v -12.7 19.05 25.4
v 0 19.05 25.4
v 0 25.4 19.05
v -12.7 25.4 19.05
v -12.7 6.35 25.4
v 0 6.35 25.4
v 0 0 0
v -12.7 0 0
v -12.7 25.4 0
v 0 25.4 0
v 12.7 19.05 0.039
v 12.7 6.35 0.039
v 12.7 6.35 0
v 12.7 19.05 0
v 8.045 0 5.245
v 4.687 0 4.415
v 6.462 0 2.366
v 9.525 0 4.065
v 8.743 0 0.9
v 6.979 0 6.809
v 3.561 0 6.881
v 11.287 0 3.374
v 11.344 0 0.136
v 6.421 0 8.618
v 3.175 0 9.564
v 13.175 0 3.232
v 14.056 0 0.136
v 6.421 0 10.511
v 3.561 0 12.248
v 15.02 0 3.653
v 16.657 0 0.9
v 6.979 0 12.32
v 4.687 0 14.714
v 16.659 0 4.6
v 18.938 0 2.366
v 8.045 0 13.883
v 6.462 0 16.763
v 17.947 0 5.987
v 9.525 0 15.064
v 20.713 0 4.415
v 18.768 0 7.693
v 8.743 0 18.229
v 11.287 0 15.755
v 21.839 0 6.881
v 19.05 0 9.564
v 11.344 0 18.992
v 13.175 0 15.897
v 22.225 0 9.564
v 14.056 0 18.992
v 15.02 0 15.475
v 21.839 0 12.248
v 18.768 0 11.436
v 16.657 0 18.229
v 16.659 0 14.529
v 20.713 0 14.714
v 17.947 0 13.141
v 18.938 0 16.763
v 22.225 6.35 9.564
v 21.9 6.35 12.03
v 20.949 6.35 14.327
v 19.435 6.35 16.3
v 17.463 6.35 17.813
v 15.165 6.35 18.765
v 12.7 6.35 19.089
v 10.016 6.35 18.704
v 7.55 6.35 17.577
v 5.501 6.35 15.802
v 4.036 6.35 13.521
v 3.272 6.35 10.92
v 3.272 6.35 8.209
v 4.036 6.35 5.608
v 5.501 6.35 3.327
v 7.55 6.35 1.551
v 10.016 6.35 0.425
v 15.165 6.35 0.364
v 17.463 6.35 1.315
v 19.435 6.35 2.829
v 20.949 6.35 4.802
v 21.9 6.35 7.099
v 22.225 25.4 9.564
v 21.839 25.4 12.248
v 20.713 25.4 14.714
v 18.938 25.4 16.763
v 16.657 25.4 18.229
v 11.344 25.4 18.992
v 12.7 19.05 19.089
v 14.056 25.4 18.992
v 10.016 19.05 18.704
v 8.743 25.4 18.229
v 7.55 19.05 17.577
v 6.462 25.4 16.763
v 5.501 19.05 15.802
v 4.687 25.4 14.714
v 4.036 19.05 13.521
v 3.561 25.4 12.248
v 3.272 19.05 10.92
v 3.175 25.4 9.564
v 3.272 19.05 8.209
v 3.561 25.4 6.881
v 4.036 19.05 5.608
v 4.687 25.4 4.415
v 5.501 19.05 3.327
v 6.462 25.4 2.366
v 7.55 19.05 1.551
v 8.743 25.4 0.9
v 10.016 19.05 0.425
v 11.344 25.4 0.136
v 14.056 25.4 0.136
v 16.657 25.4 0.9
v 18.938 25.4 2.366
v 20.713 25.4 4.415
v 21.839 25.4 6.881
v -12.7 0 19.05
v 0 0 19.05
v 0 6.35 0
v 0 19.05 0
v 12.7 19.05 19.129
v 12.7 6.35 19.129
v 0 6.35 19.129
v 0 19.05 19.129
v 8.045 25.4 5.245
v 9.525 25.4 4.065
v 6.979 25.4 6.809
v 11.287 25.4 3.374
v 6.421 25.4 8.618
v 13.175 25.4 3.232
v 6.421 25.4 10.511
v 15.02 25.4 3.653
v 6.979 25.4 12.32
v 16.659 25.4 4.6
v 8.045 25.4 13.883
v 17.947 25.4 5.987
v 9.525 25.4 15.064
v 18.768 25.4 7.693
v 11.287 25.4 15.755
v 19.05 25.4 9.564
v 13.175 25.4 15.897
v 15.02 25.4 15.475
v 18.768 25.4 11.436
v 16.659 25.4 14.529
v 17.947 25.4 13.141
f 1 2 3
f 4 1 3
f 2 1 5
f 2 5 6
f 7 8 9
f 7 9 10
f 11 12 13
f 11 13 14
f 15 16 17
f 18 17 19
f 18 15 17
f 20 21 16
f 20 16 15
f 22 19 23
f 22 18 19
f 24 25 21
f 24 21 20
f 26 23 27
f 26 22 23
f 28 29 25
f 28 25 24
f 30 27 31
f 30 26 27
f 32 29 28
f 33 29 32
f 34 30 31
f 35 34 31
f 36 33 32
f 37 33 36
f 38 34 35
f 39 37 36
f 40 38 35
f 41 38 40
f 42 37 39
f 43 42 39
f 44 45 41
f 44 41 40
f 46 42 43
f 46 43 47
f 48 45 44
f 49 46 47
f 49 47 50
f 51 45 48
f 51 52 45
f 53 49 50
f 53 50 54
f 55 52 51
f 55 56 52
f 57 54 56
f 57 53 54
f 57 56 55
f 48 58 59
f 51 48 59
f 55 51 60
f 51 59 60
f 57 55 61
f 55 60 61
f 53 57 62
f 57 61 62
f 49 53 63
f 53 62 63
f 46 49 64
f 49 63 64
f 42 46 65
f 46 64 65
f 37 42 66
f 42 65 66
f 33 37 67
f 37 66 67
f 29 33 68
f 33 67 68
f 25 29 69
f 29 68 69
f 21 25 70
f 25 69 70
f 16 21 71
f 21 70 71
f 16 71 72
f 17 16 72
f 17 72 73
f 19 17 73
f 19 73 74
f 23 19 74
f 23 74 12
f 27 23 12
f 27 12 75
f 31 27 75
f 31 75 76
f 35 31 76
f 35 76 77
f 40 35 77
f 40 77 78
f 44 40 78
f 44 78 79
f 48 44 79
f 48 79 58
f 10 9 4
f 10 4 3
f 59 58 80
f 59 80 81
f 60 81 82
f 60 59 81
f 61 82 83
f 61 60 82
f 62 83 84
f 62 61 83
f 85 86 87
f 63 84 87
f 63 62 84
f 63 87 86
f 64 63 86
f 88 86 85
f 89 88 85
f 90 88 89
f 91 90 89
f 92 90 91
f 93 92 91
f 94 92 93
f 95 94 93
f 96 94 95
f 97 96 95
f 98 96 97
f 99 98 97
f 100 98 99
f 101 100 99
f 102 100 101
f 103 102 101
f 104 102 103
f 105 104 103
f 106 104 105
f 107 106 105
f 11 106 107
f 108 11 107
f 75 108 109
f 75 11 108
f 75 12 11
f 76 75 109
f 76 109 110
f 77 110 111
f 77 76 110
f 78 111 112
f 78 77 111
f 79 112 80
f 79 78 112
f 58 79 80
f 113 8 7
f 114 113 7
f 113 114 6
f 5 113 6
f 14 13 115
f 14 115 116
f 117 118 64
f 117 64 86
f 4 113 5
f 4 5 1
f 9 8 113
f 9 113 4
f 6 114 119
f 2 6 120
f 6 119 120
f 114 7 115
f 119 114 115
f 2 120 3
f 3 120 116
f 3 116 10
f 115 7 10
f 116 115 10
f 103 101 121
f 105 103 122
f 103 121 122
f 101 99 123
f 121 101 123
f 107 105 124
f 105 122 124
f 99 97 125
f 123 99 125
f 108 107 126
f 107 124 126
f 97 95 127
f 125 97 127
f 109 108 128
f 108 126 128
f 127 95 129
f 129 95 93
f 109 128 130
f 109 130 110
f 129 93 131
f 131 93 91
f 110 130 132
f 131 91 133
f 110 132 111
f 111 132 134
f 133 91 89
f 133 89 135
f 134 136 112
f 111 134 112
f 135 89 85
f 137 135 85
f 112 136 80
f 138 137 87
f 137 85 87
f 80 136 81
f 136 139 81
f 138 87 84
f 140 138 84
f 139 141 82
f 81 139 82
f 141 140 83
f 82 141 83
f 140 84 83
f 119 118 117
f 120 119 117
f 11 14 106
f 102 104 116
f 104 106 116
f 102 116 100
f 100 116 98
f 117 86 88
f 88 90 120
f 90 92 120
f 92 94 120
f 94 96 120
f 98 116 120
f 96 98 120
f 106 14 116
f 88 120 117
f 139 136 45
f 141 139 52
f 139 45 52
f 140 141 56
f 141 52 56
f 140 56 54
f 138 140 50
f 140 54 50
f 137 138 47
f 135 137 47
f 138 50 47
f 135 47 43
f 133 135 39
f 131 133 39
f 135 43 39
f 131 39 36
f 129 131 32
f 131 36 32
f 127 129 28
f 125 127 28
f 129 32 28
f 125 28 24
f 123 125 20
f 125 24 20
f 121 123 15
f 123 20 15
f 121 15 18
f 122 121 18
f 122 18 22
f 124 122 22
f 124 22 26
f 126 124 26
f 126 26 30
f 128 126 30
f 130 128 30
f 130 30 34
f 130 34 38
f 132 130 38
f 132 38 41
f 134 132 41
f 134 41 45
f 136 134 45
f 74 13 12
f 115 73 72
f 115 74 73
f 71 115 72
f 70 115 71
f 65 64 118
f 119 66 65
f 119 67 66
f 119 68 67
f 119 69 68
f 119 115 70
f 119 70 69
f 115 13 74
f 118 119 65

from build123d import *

# Parameters (mm, degrees)
F0_W          = 12.7
F0_H          = 25.4
F1_DEPTH      = 25.4
F3_DEPTH      = 12.701
F4_W          = 12.7
F4_H          = 19.128681
F5_DEPTH      = 12.7
F6_R          = 9.525
F7_DEPTH      = 6.35
F7_DEPTH_BACK = 19.05
F8_R          = 6.35
F9_DEPTH      = 25.401


with BuildPart() as f1:
    # F0 (on Top) → F1 (new body)
    with BuildSketch(Plane.XY):
        with Locations((-6.35, 12.7)):
            Rectangle(F0_W, F0_H)
    extrude(amount=F1_DEPTH)

    # F2 (on face) → F3 (cut, through all)
    with BuildSketch(Plane.YZ):
        Polygon((25.4, 19.05), (25.4, 25.4), (19.05, 25.4), align=None)
        Polygon((0, 25.4), (0, 19.05), (6.35, 25.4), align=None)
    extrude(amount=-F3_DEPTH, mode=Mode.SUBTRACT)

    # F4 (on face) → F5 (join)
    with BuildSketch(Plane.YZ):
        with Locations((12.7, 9.564341)):
            Rectangle(F4_W, F4_H)
    extrude(amount=F5_DEPTH)

    # F6 (on face) → F7 (join, two sides)
    with BuildSketch(Plane.XZ.offset(-6.35)) as f7_sk:
        with Locations((12.7, 9.56434)):
            Circle(F6_R)
    extrude(amount=F7_DEPTH)
    extrude(f7_sk.sketch, amount=-F7_DEPTH_BACK)

    # F8 (on face) → F9 (cut, through all)
    with BuildSketch(Plane.XZ):
        with Locations((12.7, 9.56434)):
            Circle(F8_R)
    extrude(amount=-F9_DEPTH, mode=Mode.SUBTRACT)


solid = f1.part
